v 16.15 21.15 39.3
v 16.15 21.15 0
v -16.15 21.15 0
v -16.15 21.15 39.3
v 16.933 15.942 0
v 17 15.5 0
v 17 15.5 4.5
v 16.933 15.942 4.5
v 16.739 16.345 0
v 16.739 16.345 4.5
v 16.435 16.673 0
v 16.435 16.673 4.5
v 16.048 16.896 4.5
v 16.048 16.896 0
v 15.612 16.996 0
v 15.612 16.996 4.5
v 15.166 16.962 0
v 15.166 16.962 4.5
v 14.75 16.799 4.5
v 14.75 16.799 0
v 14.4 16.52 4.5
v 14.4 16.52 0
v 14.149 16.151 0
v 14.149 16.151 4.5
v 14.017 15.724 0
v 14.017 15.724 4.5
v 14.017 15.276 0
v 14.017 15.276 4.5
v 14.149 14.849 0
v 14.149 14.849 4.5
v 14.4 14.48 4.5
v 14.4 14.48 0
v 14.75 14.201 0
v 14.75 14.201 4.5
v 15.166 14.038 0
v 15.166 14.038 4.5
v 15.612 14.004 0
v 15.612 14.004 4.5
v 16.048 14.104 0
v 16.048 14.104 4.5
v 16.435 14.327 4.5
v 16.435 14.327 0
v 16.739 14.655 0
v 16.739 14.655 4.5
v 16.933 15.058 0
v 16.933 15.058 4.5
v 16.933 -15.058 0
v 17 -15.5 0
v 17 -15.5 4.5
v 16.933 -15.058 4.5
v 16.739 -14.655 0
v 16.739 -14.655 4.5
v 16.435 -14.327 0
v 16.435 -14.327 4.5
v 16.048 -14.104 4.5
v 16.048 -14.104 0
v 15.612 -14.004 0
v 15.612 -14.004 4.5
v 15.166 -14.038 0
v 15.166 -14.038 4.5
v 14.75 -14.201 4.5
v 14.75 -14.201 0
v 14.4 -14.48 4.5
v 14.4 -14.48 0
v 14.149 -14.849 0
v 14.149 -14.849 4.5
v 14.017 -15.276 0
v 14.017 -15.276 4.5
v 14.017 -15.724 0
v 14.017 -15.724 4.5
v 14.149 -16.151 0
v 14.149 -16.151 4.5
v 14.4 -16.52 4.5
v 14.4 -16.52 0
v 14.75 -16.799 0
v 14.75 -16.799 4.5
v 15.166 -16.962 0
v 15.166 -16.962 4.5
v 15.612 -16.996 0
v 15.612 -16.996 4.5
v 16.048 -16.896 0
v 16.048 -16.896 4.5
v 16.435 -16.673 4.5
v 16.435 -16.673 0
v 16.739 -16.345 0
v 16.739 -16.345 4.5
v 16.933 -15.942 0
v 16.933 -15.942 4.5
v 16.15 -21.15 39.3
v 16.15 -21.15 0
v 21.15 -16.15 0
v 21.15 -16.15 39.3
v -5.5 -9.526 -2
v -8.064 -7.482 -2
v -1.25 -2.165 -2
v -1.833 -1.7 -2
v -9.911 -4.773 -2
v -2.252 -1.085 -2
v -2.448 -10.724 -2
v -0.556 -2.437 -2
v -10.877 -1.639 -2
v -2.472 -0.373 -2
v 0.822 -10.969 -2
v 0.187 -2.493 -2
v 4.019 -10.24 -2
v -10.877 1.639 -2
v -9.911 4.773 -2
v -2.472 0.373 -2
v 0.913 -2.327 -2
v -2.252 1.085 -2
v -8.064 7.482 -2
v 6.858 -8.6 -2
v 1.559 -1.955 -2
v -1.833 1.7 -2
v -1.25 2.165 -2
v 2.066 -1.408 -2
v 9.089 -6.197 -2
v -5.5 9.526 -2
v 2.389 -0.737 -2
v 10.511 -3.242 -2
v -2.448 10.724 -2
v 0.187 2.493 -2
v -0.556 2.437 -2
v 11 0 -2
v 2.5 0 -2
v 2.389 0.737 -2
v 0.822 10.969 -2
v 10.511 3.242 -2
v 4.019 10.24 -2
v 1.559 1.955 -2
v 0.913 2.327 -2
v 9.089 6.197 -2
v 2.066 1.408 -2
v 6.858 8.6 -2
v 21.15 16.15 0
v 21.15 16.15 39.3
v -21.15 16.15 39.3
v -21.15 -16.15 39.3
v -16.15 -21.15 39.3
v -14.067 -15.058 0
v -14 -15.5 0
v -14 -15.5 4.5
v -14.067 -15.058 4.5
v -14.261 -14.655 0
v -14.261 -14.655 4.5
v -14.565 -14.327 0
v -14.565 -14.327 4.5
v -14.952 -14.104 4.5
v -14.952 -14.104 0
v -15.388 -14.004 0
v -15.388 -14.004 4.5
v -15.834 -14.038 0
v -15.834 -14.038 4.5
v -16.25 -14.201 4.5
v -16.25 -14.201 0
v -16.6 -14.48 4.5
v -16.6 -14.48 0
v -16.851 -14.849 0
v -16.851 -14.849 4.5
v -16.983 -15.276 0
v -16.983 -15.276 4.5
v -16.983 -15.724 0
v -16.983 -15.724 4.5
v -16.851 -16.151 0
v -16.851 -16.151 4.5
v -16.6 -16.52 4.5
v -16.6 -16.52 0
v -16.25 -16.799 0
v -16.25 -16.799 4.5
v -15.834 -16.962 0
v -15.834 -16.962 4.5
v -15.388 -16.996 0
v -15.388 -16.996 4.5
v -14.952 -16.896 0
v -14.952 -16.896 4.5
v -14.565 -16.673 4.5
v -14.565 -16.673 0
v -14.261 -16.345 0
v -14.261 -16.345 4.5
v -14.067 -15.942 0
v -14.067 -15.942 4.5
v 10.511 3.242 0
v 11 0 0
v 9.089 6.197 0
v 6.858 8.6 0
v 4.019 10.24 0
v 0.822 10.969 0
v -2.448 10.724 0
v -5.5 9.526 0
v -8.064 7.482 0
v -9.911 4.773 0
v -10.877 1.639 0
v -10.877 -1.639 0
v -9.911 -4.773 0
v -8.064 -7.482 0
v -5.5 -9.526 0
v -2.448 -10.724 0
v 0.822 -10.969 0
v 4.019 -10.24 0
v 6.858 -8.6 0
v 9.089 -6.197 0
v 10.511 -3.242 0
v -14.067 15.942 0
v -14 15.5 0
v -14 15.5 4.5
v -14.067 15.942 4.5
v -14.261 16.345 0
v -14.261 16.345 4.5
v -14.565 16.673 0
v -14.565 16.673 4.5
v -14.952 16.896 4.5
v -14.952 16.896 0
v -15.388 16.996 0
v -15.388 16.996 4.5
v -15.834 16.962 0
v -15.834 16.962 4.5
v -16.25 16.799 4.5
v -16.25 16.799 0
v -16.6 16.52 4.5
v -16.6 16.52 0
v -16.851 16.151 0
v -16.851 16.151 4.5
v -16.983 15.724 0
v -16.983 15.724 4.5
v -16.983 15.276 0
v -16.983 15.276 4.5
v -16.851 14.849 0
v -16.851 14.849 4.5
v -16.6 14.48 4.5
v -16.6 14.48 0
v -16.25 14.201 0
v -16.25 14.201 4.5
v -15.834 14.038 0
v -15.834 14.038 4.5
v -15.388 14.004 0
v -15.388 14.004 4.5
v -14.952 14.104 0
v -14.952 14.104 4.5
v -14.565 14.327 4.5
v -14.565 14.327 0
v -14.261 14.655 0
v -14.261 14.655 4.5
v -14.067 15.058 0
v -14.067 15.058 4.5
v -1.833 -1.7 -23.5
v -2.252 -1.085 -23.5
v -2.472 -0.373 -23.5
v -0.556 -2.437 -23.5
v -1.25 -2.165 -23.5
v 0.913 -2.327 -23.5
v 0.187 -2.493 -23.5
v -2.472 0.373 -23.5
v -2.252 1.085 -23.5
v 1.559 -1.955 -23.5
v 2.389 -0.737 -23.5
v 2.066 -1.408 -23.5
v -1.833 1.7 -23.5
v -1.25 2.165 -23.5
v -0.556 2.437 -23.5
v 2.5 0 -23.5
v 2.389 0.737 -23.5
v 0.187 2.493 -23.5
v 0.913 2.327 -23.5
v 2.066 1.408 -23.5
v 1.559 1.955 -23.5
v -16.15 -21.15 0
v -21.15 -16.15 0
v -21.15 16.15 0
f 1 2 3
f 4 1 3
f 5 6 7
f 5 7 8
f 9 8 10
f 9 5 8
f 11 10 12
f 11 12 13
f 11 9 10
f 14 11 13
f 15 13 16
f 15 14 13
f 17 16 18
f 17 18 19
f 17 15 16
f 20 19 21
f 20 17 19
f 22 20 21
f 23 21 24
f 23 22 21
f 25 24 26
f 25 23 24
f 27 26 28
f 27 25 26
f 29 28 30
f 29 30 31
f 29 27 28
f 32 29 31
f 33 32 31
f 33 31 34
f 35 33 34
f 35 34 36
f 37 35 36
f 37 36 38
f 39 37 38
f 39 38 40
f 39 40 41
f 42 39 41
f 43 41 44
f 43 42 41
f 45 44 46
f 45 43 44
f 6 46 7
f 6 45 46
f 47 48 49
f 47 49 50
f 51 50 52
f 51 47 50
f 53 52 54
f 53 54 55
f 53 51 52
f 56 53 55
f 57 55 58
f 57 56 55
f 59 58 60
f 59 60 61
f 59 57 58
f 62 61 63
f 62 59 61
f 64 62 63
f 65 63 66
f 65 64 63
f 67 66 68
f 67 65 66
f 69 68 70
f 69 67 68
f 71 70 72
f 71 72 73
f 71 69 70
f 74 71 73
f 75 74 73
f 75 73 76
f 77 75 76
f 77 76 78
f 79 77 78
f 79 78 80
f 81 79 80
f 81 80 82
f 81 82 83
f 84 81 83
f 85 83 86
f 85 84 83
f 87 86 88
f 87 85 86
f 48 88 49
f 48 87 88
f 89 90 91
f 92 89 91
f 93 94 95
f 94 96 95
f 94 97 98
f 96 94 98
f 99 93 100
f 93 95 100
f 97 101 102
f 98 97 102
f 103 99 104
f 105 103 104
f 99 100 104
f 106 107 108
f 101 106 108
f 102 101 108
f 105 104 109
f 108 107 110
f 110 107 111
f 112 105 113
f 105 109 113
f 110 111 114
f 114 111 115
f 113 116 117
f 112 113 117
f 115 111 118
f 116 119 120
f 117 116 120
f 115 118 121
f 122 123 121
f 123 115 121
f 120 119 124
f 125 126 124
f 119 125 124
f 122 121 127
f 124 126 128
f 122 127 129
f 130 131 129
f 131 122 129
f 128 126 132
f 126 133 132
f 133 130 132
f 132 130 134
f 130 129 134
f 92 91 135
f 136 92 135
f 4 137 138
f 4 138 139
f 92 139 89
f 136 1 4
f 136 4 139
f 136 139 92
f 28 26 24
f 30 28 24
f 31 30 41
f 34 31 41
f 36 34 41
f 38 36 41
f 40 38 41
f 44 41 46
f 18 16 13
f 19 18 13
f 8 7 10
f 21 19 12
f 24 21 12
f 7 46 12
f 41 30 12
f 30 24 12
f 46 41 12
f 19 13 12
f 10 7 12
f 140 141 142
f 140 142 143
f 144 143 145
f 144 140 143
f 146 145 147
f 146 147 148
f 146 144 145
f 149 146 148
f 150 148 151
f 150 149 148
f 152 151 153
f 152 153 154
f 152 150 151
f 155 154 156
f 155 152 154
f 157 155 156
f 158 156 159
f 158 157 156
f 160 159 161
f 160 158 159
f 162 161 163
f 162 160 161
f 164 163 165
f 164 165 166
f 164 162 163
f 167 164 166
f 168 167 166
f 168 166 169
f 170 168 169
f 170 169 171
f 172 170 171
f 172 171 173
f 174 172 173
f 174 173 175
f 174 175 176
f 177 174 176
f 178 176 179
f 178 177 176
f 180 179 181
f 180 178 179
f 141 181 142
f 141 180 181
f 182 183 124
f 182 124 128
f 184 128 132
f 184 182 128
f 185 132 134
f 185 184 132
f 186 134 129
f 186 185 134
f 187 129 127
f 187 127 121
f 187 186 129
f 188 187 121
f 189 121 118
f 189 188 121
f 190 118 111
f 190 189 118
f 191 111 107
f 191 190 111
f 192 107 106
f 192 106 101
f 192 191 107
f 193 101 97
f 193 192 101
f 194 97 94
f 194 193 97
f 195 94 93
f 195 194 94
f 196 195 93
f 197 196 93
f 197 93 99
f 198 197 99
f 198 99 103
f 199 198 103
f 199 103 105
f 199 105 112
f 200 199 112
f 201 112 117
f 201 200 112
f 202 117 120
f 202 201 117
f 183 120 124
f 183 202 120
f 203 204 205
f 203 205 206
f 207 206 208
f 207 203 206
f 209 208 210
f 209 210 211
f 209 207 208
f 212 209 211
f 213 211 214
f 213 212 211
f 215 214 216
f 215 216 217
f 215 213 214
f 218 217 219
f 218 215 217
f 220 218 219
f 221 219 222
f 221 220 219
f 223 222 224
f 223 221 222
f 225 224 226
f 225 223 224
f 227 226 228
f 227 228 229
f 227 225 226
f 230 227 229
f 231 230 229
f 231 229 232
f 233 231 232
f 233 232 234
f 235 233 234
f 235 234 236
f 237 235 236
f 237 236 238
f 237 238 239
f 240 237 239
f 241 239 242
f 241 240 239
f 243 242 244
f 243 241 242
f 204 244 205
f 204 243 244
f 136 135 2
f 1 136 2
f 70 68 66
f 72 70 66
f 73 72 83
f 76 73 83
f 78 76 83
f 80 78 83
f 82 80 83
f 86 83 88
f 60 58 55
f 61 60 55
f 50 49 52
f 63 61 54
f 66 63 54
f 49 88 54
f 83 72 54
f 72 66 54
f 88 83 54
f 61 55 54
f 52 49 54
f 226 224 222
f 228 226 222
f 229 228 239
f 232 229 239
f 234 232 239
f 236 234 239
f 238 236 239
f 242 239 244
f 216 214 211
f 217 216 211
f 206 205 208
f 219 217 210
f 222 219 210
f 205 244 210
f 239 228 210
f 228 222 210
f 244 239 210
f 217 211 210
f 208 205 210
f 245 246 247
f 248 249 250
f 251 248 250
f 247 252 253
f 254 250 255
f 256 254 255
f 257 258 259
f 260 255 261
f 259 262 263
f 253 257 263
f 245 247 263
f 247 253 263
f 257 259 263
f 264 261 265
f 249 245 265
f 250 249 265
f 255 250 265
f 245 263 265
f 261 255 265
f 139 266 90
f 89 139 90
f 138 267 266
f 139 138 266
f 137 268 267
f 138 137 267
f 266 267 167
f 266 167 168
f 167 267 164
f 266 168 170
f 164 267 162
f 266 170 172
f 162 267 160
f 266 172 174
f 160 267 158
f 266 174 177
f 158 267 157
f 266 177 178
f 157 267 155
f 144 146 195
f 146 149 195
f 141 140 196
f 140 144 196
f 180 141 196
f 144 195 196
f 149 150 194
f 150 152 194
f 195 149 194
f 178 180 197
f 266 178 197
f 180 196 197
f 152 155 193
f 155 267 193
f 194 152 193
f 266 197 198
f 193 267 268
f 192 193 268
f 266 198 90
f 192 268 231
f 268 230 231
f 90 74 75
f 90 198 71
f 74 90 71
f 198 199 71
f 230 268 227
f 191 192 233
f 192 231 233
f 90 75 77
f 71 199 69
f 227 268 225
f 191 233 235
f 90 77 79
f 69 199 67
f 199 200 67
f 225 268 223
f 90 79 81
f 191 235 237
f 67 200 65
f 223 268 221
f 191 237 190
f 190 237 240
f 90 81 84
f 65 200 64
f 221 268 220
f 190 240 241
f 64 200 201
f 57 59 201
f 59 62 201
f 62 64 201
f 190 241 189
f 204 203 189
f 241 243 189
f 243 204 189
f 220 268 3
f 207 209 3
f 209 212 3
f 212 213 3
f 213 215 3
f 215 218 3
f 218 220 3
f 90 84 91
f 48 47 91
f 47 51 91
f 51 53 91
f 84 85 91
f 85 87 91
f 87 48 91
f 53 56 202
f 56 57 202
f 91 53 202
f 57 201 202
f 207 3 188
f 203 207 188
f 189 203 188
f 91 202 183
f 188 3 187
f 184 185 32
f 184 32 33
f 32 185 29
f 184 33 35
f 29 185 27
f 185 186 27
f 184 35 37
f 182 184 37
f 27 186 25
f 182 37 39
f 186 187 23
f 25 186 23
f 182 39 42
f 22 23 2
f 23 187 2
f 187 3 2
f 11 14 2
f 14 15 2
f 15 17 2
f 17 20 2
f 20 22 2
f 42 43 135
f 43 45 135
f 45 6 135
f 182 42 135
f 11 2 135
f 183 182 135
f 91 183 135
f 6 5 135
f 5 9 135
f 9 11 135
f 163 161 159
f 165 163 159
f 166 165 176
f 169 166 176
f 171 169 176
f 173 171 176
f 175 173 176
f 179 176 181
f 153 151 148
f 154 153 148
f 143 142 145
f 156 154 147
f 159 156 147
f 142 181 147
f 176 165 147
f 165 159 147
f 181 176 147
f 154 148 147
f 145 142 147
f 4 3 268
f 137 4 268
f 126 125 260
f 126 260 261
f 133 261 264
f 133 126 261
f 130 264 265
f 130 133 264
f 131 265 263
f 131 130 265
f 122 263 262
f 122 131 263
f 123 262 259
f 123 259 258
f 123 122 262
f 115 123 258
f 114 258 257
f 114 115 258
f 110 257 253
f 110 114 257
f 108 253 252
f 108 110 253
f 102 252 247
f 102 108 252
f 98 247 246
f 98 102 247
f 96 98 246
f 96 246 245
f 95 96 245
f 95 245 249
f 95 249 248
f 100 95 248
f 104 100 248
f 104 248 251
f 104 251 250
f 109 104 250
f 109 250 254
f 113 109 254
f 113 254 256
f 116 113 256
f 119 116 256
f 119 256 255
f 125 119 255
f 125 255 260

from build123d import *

# Parameters (mm, degrees)
PAD_DEPTH    = 39.3
SKETCH001_R  = 1.5
POCKET_DEPTH = 4.5
SKETCH002_R  = 11
PAD001_DEPTH = 2
SKETCH003_R  = 2.5
PAD002_DEPTH = 23.5


with BuildPart() as part:
    # Sketch → Pad (new body)
    with BuildSketch(Plane.XY):
        Polygon((-16.15, 21.15), (-21.15, 16.15), (-21.15, -16.15), (-16.15, -21.15), (16.15, -21.15), (21.15, -16.15), (21.15, 16.15), (16.15, 21.15), align=None)
    extrude(amount=PAD_DEPTH)

    # Sketch001 → Pocket (cut)
    with BuildSketch(Plane.XY):
        with Locations((-15.5, 15.5)):
            Circle(SKETCH001_R)
        with Locations((-15.5, -15.5)):
            Circle(SKETCH001_R)
        with Locations((15.5, -15.5)):
            Circle(SKETCH001_R)
        with Locations((15.5, 15.5)):
            Circle(SKETCH001_R)
    extrude(amount=POCKET_DEPTH, mode=Mode.SUBTRACT)

    # Sketch002 → Pad001 (join)
    with BuildSketch(Plane.XY):
        Circle(SKETCH002_R)
    extrude(amount=-PAD001_DEPTH)

    # Sketch003 → Pad002 (join)
    with BuildSketch(Plane.XY):
        Circle(SKETCH003_R)
    extrude(amount=-PAD002_DEPTH)


solid = part.part
